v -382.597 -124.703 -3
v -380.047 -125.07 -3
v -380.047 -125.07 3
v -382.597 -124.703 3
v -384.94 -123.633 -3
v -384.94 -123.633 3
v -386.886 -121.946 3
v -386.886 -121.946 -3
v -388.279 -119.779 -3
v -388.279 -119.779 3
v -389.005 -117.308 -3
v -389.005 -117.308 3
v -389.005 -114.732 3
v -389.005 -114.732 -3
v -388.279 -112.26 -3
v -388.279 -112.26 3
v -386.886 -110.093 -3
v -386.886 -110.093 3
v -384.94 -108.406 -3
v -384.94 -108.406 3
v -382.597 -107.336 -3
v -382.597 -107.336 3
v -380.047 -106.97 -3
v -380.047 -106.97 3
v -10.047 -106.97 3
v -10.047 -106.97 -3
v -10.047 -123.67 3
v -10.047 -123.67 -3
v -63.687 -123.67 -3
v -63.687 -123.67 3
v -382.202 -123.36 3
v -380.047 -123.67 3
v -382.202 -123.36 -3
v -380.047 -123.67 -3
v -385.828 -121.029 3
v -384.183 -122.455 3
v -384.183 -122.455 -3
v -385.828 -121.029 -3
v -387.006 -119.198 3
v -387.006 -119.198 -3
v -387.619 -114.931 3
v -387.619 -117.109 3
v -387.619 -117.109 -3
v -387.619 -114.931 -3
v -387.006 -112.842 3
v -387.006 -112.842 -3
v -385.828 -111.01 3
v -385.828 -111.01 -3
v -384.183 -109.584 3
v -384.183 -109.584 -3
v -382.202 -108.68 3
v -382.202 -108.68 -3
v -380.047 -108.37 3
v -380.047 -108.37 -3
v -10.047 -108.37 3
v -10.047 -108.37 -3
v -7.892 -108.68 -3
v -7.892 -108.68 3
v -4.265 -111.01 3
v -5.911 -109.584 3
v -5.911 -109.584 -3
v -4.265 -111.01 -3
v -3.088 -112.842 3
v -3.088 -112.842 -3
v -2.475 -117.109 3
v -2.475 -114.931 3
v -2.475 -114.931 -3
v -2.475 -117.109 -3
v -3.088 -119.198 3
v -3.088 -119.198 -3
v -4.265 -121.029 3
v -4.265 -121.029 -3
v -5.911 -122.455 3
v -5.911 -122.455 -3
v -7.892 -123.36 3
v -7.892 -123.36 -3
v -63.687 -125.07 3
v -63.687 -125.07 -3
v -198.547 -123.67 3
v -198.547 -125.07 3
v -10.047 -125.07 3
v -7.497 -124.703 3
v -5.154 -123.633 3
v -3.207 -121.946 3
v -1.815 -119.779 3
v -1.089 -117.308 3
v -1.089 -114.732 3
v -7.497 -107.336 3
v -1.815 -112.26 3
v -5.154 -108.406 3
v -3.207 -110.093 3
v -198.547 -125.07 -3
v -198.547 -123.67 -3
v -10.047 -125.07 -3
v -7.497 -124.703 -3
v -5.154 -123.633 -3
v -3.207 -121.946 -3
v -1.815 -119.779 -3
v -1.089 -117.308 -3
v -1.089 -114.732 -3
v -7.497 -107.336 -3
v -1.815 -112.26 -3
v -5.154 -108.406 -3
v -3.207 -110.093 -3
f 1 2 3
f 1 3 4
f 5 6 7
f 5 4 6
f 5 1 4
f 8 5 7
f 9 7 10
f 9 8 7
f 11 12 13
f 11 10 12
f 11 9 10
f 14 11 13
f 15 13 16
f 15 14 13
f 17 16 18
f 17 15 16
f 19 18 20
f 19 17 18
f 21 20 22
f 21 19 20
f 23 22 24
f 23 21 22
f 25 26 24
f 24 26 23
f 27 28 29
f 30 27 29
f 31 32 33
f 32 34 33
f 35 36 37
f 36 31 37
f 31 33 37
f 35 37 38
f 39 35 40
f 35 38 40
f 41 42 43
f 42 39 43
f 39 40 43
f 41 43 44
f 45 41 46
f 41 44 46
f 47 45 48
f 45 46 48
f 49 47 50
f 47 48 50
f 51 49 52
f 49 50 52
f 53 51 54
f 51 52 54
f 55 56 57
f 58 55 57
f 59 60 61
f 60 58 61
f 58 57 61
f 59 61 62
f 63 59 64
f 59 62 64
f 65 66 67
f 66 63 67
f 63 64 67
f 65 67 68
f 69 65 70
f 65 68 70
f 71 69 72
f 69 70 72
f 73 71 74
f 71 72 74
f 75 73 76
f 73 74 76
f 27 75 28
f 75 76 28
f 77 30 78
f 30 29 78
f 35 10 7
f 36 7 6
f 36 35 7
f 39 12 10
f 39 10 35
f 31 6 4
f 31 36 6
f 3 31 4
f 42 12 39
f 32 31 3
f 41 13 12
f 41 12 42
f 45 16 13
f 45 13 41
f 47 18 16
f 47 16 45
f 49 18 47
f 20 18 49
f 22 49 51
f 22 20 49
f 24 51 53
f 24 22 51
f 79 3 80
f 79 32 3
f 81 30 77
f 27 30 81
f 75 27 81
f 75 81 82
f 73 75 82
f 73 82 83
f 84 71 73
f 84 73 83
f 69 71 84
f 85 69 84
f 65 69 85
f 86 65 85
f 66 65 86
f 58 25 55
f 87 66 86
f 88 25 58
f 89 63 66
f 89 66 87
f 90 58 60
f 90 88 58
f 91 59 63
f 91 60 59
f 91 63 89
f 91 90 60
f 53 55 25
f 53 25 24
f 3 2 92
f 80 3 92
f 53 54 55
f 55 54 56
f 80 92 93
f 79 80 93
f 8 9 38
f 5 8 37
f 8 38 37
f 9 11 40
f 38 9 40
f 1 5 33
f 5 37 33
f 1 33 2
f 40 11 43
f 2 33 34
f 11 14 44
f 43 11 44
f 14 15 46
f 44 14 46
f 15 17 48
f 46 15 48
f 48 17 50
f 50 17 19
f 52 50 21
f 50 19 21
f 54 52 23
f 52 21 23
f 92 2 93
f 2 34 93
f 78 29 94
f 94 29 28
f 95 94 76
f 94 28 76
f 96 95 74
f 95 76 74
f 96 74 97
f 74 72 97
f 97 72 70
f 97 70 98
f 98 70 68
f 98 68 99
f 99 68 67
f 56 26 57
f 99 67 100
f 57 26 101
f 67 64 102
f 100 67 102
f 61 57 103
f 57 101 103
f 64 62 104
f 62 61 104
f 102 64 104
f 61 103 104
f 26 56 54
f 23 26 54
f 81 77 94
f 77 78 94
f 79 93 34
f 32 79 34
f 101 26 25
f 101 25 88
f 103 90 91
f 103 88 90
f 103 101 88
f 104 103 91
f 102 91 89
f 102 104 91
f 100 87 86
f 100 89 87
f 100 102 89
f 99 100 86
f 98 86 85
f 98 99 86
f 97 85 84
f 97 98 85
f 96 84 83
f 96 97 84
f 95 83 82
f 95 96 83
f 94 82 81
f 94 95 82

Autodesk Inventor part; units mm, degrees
ref_plane "YZ Plane" through (0, 0, 0) normal (1, 0, 0) x (0, 1, 0)
ref_plane "XZ Plane" through (0, 0, 0) normal (0, 1, 0) x (-1, 0, 0)
ref_plane "XY Plane" through (0, 0, 0) normal (0, 0, 1) x (1, 0, 0)
sketch "Skizze1" plane through (0, 0, 0) normal (0, 0, 1) x (1, 0, 0)
  circle A0 centre (-380.0469, -116.0198) radius 3 construction
  circle A1 centre (-10.0469, -116.0198) radius 3.1 construction
  circle A2 centre (-380.0469, -116.0198) radius 9.05 construction
  circle A3 centre (-10.0469, -116.0198) radius 9.05 construction
  line L0 (-10.0469, -106.9698) -> (-380.0469, -106.9698)
  line L1 (-380.0469, -116.0198) -> (-380.0469, -106.9698) construction
  arc A4 (-380.0469, -106.9698) -> (-380.0469, -125.0698) centre (-380.0469, -116.0198) ccw
  line L2 (-380.0469, -125.0698) -> (-10.0469, -125.0698)
  arc A5 (-10.0469, -125.0698) -> (-10.0469, -106.9698) centre (-10.0469, -116.0198) ccw
  circle A6 centre (-380.0469, -116.0198) radius 7.65 construction
  circle A7 centre (-10.0469, -116.0198) radius 7.65 construction
  line L3 (-10.0469, -123.6698) -> (-380.0469, -123.6698)
  arc A8 (-380.0469, -108.3698) -> (-380.0469, -123.6698) centre (-380.0469, -116.0198) ccw
  line L4 (-380.0469, -108.3698) -> (-10.0469, -108.3698)
  arc A9 (-10.0469, -123.6698) -> (-10.0469, -108.3698) centre (-10.0469, -116.0198) ccw
  line L5 (-198.5469, -125.0698) -> (-198.5469, -123.6698)
  line L6 (-63.6869, -123.6698) -> (-63.6869, -125.0698)
  line L7 (-10.0469, -124.2698) -> (-380.0469, -124.2698) construction
  arc A10 (-380.0469, -107.7698) -> (-380.0469, -124.2698) centre (-380.0469, -116.0198) ccw construction
  line L8 (-380.0469, -107.7698) -> (-10.0469, -107.7698) construction
  arc A11 (-10.0469, -124.2698) -> (-10.0469, -107.7698) centre (-10.0469, -116.0198) ccw construction
  point P0 (0, 0)
  dimension "d0" = 370
  dimension "d3" = 370
  dimension "d8" = 53.64
  dimension "d9" = 181.5
  dimension "d11" = 181.5
  dimension "d12" = 370
  dimension "d13" = 53.64
  dimension "d14" = 8.25
  dimension "d15" = 8.25
  dimension "d16" = 15.3
  dimension "d17" = 15.3
  dimension "d18" = 0.8
  dimension "d19" = 1.4
  dimension "d20" = 18.1
extrude "Extrusion1" add sketch "Skizze1" along normal mid plane 6 contours A5 L2 L6 L3 A9 L4 A8 L5 A4 L0
equation "\"d8\" = Riemen_L_UpBottom"
equation "\"d9\" = Riemen_L_BottomUp"
equation "\"d17\" = d16"
equation "\"d2\" = d1"
equation "\"Riemen_L_UpBottom\" = 53.64"
equation "\"Bogenlaenge\" = 27.70885"
equation "\"Riemenlaenge\" = d12 + 2 * Bogenlaenge + d13 + d11"
equation "\"Riemen_L_BottomUp\" = 181.5"
equation "\"d1\" = 21.14"
properties part number "Riemen_T5" material "Gummi"
